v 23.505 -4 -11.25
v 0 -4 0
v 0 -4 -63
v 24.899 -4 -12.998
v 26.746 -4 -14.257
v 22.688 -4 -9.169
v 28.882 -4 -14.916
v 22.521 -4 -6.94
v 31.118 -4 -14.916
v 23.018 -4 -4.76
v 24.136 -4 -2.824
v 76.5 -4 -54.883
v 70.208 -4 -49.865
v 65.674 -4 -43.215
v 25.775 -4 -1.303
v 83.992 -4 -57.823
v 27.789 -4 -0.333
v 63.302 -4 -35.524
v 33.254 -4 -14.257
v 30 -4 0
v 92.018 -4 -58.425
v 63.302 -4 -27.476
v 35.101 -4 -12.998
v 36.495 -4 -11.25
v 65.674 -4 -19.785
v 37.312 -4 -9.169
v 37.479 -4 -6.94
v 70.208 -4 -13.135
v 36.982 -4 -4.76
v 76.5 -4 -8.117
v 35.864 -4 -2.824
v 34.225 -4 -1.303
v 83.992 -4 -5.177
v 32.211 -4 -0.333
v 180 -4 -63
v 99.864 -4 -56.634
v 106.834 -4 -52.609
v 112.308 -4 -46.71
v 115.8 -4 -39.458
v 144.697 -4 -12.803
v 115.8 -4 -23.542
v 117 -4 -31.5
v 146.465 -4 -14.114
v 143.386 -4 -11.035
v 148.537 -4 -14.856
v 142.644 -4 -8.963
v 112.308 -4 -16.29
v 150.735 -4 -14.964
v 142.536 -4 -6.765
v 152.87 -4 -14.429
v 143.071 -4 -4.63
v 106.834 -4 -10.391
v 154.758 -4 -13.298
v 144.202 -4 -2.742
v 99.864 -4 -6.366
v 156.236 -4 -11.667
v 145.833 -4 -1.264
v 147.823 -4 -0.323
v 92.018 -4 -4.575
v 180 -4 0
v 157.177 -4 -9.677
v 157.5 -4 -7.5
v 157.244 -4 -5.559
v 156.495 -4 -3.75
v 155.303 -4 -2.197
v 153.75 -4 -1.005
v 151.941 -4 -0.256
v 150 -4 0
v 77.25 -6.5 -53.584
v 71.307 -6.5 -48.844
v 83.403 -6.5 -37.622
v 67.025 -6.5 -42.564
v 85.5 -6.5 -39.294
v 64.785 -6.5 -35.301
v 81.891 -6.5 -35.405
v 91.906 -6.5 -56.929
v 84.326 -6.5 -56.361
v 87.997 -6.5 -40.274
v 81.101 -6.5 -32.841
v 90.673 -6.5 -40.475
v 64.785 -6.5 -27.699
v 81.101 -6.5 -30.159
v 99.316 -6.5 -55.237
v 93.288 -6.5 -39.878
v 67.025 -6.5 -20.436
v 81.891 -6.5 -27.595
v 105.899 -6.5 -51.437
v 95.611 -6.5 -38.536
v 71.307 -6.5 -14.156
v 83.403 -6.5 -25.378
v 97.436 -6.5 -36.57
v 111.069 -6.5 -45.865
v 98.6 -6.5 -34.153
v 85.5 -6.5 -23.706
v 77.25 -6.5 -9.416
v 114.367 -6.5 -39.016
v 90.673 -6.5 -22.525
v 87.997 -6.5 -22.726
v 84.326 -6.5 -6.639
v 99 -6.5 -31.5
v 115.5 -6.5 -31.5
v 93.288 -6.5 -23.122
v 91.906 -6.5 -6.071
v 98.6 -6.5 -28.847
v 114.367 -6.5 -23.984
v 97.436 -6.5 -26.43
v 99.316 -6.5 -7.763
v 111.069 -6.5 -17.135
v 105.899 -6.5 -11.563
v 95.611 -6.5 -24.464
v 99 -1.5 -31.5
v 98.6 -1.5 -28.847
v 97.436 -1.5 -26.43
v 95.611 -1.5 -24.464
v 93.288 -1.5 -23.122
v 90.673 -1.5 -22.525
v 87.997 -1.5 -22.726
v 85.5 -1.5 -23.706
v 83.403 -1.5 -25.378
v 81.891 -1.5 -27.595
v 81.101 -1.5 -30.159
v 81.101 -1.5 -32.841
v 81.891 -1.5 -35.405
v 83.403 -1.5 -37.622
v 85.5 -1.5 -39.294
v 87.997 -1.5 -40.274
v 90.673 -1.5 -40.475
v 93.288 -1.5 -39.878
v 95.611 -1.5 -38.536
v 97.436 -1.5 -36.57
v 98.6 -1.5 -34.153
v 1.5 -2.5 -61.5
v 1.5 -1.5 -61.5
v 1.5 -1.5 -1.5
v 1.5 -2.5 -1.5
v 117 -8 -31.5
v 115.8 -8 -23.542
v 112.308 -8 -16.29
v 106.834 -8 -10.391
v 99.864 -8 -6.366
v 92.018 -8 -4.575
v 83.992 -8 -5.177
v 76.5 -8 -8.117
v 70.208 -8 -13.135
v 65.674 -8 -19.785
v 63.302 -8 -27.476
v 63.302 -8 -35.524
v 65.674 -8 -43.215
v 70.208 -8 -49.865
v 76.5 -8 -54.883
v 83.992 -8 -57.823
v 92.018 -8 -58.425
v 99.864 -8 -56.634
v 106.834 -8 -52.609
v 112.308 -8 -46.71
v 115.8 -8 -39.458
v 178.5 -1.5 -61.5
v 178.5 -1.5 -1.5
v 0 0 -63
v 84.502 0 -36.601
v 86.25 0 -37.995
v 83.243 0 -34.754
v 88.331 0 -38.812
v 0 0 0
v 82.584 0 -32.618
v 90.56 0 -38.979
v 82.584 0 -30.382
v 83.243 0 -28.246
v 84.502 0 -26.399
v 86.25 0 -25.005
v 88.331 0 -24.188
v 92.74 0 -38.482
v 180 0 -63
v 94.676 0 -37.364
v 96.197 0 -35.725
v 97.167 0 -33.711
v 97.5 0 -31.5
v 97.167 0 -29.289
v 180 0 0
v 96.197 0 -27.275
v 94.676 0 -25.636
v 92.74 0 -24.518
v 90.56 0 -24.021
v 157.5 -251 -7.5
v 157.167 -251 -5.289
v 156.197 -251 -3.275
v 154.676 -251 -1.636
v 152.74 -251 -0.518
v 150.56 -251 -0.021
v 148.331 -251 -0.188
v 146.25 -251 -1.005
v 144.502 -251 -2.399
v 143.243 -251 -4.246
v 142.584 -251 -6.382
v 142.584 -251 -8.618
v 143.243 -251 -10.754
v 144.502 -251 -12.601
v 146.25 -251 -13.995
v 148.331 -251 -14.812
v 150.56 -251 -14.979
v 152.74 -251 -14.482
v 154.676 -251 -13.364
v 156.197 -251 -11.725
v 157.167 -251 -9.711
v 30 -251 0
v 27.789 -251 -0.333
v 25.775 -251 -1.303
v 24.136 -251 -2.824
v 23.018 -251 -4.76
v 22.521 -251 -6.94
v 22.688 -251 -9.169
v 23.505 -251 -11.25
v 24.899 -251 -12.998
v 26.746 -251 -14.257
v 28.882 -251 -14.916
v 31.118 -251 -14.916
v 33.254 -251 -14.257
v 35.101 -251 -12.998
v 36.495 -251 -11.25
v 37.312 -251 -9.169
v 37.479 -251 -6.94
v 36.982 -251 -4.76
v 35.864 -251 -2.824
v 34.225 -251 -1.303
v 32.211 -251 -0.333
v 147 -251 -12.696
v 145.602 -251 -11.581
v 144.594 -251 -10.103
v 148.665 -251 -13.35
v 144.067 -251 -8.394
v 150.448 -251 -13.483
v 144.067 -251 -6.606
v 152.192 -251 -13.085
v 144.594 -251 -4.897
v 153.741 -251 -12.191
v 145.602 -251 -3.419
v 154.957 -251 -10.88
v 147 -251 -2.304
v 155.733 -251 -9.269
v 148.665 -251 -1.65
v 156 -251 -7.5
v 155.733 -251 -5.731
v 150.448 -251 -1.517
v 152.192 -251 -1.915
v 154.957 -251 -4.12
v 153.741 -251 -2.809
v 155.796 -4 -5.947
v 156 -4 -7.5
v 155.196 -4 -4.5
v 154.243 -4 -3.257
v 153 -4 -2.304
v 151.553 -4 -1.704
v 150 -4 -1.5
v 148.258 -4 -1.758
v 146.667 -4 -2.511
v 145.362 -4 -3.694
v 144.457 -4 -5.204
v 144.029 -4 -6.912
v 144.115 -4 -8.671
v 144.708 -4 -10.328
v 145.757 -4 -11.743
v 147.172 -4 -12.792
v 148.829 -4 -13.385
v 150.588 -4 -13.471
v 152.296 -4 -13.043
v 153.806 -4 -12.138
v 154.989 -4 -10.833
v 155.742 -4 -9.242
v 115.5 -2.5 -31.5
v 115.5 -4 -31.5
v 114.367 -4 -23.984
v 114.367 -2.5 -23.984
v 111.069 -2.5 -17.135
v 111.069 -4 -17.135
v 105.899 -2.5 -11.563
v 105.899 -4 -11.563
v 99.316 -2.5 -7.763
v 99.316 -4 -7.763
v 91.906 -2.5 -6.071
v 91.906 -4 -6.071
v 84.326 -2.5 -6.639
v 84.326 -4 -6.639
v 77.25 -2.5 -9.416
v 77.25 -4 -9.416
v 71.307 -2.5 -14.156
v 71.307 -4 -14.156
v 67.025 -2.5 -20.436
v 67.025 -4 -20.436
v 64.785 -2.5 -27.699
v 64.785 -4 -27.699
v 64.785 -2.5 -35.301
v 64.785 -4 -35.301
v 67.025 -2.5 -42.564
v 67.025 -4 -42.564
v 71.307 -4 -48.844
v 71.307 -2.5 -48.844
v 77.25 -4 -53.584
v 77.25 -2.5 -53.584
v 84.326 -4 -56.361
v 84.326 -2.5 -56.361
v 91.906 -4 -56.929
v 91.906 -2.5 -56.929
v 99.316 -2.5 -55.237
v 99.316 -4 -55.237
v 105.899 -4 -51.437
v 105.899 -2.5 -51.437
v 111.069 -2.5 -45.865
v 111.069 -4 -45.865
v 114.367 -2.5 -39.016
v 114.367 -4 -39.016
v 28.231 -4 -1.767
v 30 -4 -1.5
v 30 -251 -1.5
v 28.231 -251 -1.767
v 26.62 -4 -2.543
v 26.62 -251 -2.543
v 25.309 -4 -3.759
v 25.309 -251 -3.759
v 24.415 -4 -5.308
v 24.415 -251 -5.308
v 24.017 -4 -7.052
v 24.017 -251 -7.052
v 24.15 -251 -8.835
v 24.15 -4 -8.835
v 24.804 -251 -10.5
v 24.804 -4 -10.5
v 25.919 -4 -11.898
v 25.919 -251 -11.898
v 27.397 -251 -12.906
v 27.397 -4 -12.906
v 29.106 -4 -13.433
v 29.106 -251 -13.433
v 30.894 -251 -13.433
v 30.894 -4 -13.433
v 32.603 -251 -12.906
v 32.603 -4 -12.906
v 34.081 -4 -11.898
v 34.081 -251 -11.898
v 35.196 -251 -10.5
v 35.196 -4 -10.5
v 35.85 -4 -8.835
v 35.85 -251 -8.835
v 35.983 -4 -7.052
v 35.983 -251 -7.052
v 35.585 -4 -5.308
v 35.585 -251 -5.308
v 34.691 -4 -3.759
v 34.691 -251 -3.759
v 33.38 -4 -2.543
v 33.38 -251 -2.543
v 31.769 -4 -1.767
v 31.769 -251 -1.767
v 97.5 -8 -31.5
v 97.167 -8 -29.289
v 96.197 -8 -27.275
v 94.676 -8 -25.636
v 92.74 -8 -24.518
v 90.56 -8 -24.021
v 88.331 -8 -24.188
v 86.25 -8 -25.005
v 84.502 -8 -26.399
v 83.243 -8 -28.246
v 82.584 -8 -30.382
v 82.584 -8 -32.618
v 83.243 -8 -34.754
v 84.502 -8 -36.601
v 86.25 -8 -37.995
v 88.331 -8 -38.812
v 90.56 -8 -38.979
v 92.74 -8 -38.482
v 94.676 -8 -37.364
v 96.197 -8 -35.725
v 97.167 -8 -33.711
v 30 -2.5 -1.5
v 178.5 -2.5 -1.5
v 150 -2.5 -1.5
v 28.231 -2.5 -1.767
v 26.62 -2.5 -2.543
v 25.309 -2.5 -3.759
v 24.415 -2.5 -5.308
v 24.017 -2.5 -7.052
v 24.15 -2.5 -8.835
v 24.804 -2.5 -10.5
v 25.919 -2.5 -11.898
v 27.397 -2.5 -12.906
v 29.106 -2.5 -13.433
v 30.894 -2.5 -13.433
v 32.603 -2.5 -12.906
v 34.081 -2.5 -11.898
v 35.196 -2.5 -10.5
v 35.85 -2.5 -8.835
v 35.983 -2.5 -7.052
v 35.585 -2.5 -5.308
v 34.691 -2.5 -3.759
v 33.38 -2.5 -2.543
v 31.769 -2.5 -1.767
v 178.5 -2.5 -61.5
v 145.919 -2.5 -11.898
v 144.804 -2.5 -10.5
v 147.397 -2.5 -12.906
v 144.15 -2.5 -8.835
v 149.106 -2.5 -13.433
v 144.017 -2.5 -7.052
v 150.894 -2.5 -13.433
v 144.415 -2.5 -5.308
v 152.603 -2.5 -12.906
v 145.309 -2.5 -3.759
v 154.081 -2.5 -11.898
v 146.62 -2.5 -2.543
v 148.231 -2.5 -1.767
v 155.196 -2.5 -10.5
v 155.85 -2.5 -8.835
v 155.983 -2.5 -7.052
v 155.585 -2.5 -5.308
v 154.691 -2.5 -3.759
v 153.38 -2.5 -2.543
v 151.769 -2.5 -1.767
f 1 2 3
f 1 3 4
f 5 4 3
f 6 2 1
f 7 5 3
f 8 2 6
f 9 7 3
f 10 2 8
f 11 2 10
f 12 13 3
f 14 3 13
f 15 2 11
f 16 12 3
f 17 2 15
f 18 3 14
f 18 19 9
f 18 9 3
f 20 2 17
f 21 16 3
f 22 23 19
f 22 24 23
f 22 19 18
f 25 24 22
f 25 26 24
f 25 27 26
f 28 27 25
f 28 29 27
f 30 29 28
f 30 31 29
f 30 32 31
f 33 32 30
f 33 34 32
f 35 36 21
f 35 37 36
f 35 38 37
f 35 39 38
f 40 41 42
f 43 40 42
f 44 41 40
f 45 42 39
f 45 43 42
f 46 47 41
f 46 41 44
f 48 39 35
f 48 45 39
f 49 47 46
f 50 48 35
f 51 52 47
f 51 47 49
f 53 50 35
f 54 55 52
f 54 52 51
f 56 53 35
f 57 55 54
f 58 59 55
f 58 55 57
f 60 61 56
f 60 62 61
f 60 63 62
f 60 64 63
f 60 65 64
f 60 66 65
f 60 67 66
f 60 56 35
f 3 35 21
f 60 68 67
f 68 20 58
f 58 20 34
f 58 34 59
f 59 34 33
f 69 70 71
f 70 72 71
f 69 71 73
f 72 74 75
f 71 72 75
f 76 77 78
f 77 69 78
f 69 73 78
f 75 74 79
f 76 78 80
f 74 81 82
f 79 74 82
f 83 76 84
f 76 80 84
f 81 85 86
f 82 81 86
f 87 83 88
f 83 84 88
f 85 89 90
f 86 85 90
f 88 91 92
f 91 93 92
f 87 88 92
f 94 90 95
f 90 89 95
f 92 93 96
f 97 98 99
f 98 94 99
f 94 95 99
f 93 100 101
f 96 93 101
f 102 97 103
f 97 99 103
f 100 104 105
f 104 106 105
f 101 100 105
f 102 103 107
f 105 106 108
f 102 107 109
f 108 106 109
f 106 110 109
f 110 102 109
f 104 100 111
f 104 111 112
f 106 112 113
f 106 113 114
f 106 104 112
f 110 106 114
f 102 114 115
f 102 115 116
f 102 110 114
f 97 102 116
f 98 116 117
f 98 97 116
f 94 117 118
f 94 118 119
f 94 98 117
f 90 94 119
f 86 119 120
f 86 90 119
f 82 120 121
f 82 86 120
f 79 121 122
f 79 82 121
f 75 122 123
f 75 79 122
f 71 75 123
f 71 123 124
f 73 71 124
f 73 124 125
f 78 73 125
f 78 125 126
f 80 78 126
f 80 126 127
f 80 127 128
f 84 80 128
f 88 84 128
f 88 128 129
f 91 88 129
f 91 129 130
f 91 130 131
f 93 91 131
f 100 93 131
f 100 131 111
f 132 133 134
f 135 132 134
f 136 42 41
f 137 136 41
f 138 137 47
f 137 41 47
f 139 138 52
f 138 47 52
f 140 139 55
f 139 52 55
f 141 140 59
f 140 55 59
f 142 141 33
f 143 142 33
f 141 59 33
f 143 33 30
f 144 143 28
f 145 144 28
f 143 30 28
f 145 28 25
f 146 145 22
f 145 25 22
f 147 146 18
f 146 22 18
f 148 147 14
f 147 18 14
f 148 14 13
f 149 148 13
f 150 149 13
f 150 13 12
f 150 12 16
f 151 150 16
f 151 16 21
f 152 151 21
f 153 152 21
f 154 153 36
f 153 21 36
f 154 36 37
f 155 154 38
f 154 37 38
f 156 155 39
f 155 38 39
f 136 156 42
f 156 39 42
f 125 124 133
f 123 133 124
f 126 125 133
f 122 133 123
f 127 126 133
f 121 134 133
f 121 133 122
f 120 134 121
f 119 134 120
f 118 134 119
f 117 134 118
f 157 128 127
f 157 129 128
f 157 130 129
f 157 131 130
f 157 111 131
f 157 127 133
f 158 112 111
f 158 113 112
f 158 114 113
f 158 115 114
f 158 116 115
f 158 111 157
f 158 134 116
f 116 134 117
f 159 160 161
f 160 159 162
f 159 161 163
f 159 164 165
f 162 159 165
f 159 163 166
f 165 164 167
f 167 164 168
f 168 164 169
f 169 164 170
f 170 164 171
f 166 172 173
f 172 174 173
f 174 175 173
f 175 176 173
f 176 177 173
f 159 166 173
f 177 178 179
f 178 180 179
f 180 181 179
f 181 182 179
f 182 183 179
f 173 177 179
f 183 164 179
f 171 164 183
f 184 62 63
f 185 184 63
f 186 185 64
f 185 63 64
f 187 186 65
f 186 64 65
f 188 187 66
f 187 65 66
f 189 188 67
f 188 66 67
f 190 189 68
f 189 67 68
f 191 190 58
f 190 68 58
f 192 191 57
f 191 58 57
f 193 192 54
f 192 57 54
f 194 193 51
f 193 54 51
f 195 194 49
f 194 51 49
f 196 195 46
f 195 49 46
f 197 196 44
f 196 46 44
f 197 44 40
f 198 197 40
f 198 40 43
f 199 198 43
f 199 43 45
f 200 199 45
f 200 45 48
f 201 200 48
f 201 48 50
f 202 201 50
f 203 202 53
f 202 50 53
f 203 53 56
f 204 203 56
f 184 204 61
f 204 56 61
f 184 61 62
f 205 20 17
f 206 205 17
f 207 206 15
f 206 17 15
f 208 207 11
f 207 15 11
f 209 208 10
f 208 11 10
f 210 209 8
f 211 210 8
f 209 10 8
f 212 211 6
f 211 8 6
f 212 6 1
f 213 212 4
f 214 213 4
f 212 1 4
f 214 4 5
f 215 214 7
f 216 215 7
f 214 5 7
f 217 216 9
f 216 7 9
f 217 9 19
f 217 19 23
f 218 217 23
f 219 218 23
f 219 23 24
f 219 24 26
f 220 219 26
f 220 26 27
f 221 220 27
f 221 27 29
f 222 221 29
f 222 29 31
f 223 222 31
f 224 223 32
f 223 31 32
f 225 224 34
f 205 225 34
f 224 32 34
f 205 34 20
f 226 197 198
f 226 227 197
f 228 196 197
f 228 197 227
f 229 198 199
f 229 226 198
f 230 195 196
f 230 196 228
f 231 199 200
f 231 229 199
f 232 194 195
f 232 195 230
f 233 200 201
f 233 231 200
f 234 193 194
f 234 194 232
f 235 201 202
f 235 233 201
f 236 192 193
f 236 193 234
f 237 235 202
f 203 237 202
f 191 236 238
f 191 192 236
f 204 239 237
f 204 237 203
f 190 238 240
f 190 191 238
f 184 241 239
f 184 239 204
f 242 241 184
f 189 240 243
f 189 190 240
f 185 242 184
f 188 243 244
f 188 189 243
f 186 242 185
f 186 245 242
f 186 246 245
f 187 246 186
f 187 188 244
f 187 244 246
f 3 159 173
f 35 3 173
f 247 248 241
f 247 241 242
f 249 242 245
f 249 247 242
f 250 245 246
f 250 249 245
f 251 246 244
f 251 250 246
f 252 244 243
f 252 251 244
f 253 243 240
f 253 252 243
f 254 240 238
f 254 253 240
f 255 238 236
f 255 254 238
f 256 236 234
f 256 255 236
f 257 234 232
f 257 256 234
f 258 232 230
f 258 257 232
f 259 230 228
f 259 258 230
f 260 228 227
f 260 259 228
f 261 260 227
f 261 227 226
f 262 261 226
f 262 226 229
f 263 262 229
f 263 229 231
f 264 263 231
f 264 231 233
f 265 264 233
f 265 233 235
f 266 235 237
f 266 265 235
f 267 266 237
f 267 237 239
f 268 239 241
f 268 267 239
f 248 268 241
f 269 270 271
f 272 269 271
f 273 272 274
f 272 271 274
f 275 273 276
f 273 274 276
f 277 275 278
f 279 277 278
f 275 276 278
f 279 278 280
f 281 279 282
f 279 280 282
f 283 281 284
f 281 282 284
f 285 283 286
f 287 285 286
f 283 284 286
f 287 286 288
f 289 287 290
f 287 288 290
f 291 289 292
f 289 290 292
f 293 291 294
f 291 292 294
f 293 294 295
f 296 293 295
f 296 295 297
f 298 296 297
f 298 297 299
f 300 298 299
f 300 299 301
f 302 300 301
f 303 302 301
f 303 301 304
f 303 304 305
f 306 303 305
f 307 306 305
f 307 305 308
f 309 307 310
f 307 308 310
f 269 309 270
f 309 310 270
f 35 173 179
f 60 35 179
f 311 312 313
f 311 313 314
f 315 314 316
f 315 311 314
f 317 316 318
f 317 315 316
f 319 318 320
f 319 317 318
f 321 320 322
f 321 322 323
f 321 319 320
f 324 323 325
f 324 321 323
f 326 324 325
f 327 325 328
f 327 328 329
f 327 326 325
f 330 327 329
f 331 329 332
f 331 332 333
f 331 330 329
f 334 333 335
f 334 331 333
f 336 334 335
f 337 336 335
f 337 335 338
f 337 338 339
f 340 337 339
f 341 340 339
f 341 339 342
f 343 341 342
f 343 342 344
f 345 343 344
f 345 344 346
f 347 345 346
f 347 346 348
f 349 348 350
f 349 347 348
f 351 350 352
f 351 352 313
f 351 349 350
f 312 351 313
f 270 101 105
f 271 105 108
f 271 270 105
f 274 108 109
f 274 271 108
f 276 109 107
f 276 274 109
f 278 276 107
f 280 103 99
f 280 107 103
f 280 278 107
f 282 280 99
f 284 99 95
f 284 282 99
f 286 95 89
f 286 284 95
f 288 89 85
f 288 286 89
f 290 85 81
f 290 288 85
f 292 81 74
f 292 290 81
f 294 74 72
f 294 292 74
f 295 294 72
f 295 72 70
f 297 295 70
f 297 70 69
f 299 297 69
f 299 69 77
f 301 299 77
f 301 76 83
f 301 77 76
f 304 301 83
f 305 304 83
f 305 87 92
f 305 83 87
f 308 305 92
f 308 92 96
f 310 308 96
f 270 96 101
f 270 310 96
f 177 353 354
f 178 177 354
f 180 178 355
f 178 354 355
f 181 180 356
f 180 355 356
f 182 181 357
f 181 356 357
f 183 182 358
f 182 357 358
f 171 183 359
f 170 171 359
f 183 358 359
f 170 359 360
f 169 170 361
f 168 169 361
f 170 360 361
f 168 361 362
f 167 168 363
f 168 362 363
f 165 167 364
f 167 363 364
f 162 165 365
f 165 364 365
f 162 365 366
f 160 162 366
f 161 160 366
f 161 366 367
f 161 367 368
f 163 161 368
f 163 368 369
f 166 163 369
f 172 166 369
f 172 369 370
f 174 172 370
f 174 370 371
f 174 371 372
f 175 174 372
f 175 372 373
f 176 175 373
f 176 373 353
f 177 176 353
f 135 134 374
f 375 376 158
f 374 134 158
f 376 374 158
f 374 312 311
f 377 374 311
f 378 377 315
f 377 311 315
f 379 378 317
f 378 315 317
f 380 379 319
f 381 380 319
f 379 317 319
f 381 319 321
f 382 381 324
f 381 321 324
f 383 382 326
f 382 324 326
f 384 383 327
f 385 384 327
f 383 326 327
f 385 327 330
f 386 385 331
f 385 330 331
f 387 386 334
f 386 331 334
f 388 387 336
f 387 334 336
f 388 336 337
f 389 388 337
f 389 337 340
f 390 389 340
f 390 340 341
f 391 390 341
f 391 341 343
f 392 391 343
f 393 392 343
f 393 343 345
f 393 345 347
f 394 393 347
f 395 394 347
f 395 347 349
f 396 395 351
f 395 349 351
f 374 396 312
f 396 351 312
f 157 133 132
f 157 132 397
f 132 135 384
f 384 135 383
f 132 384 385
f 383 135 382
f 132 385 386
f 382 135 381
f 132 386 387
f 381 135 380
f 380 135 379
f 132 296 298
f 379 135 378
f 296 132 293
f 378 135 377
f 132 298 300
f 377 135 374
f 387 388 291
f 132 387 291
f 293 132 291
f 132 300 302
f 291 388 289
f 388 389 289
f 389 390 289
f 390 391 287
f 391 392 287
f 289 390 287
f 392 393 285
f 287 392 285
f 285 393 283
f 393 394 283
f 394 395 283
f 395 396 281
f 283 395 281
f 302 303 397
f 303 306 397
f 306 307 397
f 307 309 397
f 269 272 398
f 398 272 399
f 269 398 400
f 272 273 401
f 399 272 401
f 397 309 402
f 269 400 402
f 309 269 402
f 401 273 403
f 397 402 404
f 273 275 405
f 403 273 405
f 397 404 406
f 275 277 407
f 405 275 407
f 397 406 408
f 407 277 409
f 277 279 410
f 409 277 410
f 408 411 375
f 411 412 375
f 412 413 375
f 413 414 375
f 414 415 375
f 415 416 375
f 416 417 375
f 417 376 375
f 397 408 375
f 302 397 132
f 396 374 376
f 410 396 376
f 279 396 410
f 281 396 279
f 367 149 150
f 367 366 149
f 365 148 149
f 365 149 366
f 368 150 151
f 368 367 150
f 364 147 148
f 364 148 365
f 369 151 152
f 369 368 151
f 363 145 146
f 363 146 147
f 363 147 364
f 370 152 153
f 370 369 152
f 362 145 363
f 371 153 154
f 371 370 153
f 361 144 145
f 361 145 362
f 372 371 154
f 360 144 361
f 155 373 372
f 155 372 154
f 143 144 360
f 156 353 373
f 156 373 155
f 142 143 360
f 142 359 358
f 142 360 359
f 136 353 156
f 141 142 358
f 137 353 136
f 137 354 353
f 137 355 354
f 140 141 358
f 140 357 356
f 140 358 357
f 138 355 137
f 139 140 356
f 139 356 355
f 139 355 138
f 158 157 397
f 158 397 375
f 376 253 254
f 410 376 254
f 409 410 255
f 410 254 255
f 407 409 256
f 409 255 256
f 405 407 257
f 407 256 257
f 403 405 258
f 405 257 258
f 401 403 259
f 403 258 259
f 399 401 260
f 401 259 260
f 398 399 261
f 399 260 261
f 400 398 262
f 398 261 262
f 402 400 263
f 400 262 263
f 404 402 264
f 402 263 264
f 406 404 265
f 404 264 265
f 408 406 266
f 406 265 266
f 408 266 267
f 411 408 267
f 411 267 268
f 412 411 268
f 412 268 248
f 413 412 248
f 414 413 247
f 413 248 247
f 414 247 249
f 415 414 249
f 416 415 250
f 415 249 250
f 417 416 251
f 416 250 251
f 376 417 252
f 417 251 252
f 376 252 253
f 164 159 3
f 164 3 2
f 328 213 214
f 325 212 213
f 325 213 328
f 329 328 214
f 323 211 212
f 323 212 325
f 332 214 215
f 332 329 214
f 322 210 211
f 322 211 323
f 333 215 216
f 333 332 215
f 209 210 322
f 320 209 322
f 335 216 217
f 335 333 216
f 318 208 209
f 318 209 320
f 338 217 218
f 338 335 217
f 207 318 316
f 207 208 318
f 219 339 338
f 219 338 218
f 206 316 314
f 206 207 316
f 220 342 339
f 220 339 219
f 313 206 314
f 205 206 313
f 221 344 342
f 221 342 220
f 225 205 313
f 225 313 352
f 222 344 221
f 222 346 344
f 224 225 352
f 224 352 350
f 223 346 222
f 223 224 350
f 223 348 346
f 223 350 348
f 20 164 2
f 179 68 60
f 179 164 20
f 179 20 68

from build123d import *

# Parameters (mm, degrees)
F0_W     = 180
F0_H     = 63
F1_DEPTH = 4
F2_R     = 27
F3_DEPTH = 4
F4_DEPTH = 247
F5_R     = 7.5
F6_DEPTH = 25
F7_T     = 1.5


# Not quite as in the source:
# - a shell that OpenCascade refuses in one call is made with other operations: the cavity is built on its own and cut out


with BuildPart() as f1:
    # F0 (on Front) → F1 (new body)
    with BuildSketch(Plane.XZ):
        with Locations((90, -31.5)):
            Rectangle(F0_W, F0_H)
    extrude(amount=F1_DEPTH)

    # F2 (on face) → F3 (join)
    with BuildSketch(Plane.XZ.offset(4)):
        with Locations((90, -31.5)):
            Circle(F2_R)
    extrude(amount=F3_DEPTH)

    # F2 (on face) → F4 (join)
    with BuildSketch(Plane.XZ.offset(4)):
        with BuildLine():
            ThreePointArc((37.5, -7.5), (35.3033008593, -2.1966991415), (30.0000000011, 0))
            ThreePointArc((30.0000000011, 0), (24.6966991407, -12.8033008585), (37.5, -7.5))
        make_face()
        with BuildLine():
            ThreePointArc((150, 0), (144.6966991411, -12.8033008589), (157.5, -7.5))
            ThreePointArc((157.5, -7.5), (155.3033008589, -2.1966991411), (150, 0))
        make_face()
    extrude(amount=F4_DEPTH)

    # F5 (on face) → F6 (cut)
    with BuildSketch(Plane.XZ.offset(8)):
        with Locations((90, -31.5)):
            Circle(F5_R)
    extrude(amount=-F6_DEPTH, mode=Mode.SUBTRACT)

    # F7: shell of thickness 1.5, made by hand


with BuildPart() as f7_core1:
    # F7_t2: copy of F1
    add(f1.part)

    # the walls: a layer under each face that stays
    f7_faces = [f7_core1.faces().sort_by_distance(p)[0] for p in [
        (90, -2, 0),
        (180, -2, -31.5),
        (0, -2, -31.5),
        (30, 0, -52.5),
        (30, -4, -52.5),
        (90, -2, -63),
        (82.5, -4, -31.5),
        (63, -6, -31.5),
        (29.9999999989, -127.5, -15),
        (150, -127.5, -15),
        (72, -8, -49.5),
    ]]
    thicken(f7_faces, amount=-F7_T, mode=Mode.SUBTRACT)

    # F7_s3 → F7_t4 (revolve, cut)
    with BuildSketch(Plane.XY.offset(-31.5)):
        Polygon((117.015, -4.015), (117, -2.5), (115.5, -2.5), (115.5, -4), align=None)
    revolve(axis=Axis((90, -4, -31.5), (0, -1, 0)), mode=Mode.SUBTRACT)

    # F7_s5 → F7_t6 (revolve, cut)
    with BuildSketch(Plane.YZ.offset(30)):
        Polygon((-4.015, 0.015), (-2.5, 0), (-2.5, -1.5), (-4, -1.5), align=None)
    revolve(axis=Axis((30, -4, -7.5), (0, -1, 0)), mode=Mode.SUBTRACT)

    # F7_s7 → F7_t8 (revolve, cut)
    with BuildSketch(Plane.YZ.offset(150)):
        Polygon((-4.015, 0.015), (-2.5, 0), (-2.5, -1.5), (-4, -1.5), align=None)
    revolve(axis=Axis((150, -4, -7.5), (0, -1, 0)), mode=Mode.SUBTRACT)


with BuildPart() as f1_1:
    add(f1.part)

    # what is left inside the walls is the cavity
    f7_cavity = [f7_core1.part.solids().sort_by_distance(p)[0] for p in [
        (90, -1.515, -41.5),
    ]]
    add(f7_cavity, mode=Mode.SUBTRACT)


solid = f1_1.part
